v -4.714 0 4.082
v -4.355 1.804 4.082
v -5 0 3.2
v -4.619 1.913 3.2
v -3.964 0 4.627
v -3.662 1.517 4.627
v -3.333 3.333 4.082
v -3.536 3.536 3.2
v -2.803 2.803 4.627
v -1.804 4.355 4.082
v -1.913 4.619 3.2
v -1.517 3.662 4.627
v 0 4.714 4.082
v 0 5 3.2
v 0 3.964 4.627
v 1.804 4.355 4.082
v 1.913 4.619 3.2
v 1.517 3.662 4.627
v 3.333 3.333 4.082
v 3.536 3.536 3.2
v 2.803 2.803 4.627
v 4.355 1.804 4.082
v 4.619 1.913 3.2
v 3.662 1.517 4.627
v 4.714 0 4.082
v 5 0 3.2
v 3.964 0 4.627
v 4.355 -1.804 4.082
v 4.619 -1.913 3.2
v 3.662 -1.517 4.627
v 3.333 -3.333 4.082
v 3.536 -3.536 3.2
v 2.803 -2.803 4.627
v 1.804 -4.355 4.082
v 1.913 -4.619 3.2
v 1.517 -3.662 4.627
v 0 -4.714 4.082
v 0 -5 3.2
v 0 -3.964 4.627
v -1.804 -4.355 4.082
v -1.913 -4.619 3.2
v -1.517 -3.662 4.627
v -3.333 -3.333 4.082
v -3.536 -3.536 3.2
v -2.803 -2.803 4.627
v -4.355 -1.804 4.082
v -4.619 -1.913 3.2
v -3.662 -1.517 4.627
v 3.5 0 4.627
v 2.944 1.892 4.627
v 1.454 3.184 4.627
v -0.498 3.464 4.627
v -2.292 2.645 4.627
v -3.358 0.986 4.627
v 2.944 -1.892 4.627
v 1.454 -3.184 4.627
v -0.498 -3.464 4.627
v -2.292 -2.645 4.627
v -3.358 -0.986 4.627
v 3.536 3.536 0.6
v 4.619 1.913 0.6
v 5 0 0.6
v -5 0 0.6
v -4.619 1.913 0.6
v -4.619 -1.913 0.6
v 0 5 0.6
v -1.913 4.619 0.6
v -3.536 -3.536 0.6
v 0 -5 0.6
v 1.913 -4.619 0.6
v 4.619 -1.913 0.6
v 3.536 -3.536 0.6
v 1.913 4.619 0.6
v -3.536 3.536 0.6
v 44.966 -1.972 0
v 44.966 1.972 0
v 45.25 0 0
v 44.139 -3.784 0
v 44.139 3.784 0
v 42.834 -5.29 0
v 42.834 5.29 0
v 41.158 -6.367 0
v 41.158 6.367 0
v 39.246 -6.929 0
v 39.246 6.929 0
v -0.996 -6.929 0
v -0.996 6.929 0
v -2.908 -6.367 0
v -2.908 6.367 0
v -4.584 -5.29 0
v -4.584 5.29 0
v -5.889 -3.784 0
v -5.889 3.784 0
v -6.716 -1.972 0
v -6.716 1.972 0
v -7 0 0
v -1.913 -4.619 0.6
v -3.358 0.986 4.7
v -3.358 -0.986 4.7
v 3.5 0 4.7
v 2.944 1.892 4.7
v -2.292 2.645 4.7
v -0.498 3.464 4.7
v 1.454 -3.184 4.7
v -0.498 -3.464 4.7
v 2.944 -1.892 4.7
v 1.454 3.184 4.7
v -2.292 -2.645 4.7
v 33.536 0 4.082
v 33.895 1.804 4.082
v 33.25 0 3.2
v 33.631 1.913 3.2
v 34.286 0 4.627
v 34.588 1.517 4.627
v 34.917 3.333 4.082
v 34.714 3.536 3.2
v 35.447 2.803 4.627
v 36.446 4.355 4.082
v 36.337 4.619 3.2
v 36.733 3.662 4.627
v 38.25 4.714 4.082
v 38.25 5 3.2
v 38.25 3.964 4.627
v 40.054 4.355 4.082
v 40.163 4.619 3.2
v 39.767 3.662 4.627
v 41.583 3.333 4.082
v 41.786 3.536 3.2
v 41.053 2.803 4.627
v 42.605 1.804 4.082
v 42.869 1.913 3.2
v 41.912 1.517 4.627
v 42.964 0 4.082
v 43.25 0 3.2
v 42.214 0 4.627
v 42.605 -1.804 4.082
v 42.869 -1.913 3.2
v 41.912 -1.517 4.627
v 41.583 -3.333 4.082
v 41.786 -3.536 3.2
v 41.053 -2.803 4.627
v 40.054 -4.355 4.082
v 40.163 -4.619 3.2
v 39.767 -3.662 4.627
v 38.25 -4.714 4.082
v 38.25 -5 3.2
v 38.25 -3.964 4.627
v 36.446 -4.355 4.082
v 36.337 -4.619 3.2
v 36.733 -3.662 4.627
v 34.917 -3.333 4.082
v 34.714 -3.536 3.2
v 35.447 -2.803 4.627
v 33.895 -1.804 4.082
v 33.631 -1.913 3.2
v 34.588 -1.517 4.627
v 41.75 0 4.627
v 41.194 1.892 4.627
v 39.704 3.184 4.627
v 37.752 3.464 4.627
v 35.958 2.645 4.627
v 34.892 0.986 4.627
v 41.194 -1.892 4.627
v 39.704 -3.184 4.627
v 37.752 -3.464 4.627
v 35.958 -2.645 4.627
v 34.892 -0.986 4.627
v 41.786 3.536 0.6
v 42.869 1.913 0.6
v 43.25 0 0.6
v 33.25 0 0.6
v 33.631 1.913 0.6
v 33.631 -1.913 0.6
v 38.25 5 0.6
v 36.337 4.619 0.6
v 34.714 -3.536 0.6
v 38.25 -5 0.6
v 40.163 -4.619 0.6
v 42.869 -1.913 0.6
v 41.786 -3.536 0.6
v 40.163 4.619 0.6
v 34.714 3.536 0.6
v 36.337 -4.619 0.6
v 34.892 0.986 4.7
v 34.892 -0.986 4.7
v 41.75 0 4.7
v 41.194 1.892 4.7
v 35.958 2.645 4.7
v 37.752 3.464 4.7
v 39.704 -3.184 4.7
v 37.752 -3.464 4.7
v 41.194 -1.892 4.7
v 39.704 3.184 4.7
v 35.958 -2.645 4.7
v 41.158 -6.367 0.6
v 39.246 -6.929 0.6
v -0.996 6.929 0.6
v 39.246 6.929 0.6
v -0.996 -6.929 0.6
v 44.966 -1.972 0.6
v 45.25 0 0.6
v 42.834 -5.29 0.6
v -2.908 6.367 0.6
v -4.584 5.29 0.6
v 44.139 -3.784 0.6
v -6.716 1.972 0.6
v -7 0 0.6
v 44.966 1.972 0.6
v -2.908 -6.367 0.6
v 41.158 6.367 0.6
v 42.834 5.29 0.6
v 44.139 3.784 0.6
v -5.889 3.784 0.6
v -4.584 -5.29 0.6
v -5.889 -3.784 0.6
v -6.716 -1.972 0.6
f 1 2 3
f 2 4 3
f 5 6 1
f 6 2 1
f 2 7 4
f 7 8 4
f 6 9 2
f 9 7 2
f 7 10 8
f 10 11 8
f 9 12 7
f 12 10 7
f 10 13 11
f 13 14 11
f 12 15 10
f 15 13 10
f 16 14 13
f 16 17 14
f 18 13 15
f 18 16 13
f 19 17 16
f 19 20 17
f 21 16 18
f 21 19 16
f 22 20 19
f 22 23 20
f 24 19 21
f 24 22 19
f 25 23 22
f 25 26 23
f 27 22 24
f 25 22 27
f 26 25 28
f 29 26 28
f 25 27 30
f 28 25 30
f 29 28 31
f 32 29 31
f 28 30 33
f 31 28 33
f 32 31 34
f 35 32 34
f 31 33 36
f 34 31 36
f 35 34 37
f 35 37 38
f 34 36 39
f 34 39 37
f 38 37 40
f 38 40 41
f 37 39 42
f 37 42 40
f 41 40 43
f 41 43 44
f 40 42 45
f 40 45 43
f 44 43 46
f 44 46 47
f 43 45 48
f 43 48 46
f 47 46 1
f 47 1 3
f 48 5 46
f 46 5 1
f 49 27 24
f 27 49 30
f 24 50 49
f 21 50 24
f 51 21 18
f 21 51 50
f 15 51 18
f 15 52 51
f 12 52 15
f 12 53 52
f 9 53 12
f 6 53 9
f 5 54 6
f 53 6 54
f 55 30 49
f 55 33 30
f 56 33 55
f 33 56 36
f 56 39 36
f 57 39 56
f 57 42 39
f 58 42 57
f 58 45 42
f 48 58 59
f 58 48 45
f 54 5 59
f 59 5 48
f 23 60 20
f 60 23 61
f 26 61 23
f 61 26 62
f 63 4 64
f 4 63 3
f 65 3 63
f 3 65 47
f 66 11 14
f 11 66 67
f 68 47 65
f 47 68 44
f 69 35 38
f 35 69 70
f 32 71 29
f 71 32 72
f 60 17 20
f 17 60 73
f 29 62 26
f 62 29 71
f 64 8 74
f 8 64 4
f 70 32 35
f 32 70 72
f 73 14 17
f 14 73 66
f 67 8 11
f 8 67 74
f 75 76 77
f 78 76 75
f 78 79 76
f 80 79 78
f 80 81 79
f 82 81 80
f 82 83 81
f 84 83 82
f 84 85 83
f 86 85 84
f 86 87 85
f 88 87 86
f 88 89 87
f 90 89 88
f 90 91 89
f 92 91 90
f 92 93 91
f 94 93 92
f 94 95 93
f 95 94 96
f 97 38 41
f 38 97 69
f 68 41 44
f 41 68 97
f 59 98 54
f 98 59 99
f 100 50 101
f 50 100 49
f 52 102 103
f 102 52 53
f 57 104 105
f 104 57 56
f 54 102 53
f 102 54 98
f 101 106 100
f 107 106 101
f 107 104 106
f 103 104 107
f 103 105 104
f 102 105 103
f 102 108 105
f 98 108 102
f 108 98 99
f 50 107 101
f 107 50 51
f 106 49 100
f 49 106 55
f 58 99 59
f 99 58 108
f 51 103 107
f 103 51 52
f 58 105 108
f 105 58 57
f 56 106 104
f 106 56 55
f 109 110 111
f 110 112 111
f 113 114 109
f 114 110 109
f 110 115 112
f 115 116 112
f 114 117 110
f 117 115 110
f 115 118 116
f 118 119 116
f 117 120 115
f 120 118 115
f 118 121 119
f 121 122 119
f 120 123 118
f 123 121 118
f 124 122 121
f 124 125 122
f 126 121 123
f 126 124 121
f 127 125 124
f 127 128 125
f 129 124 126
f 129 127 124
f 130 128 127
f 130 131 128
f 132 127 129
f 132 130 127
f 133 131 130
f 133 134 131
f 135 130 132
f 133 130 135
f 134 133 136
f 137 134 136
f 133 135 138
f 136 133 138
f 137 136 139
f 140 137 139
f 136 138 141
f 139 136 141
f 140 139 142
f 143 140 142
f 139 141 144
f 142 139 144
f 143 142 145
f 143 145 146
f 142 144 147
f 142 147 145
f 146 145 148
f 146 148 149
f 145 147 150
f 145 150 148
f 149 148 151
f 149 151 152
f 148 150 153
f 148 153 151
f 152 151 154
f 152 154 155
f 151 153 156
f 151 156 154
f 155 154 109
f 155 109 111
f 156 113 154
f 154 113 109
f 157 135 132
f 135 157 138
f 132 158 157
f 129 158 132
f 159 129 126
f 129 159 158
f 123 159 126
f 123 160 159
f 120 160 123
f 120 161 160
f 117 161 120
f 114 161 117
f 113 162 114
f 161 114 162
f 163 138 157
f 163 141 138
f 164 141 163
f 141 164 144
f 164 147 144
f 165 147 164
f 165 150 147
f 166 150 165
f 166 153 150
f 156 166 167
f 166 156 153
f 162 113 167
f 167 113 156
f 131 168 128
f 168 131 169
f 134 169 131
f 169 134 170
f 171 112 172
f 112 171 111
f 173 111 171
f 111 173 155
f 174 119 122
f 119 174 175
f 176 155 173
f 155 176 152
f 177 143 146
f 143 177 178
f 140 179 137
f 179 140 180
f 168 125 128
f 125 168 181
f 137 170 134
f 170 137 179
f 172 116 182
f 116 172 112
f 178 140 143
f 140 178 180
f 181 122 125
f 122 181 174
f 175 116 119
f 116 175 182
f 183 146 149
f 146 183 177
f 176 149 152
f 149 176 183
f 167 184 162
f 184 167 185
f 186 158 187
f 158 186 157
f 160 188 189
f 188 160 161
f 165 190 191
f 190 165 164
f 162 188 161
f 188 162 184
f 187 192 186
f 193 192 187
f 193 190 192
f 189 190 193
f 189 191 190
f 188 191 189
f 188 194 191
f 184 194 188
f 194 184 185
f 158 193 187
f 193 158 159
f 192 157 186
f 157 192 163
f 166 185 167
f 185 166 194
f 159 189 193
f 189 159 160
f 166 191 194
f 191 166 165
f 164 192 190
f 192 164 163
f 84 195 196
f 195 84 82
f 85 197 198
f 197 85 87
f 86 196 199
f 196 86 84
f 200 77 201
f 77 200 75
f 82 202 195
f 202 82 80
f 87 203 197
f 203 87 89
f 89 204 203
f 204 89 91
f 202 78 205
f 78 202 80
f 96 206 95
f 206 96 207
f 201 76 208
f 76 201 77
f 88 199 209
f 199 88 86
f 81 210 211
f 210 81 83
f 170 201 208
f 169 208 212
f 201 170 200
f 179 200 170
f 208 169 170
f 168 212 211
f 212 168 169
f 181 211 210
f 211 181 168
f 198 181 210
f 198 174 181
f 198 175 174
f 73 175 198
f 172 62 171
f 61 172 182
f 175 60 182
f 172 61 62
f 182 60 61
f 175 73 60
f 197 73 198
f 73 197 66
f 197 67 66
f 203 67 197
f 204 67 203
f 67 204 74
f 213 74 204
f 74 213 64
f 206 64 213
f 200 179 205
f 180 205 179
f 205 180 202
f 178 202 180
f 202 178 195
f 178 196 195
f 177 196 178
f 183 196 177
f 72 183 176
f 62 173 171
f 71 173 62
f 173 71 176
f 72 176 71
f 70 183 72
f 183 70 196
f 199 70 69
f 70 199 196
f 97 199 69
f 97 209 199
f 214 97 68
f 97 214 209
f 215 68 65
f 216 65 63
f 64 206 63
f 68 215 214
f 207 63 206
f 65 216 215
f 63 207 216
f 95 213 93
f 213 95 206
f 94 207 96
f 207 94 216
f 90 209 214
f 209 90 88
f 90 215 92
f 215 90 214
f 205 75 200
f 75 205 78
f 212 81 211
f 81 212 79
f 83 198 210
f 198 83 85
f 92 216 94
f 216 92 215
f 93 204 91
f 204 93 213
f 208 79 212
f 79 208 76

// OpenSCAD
// file: tvRemoteControl-Buttons.scad
pitch=2.55;
width = 10;
thickness=0.6;
height=thickness + 4.1;
extra=2;
roundness=1.5;
textHeight=1;

module button(x,y)
{
    translate( [x*pitch, y*pitch] ) {
        difference() {
            union() {
                translate( [0,0,height-roundness] ) rotate_extrude( angle = 360, convexity = 6 ) {
                    translate( [width/2-roundness,0] ) circle( r=roundness, $fn=10 );
                }
                cylinder( d=width, h=height-roundness );
                cylinder( d=width-roundness*2, h=height );
            }
            translate( [0,0,height-textHeight] ) linear_extrude( textHeight+1 ) children();
        }
    }
}

module base(x,y)
{
    translate( [x*pitch, y*pitch] ) {
        cylinder( d=width+extra*2, thickness );
    }
}

module letter( t )
{
    text( t=t, halign="center", valign="center" );
}

module arrow()
{
    circle( d= width-roundness-2, $fn=3 );
}

module minus()
{
    square( [width-roundness-2, 2], center=true );
}

module plus()
{
    minus();
    rotate( 90 ) minus();
}
// main file
use <tvRemoteControl-Buttons.scad>;


module power()
{
    button(0,0) letter("x");
    button(15,0) letter("X");
    
    hull() {
        base(0,0);
        base(15,0);
    }
}

power();
